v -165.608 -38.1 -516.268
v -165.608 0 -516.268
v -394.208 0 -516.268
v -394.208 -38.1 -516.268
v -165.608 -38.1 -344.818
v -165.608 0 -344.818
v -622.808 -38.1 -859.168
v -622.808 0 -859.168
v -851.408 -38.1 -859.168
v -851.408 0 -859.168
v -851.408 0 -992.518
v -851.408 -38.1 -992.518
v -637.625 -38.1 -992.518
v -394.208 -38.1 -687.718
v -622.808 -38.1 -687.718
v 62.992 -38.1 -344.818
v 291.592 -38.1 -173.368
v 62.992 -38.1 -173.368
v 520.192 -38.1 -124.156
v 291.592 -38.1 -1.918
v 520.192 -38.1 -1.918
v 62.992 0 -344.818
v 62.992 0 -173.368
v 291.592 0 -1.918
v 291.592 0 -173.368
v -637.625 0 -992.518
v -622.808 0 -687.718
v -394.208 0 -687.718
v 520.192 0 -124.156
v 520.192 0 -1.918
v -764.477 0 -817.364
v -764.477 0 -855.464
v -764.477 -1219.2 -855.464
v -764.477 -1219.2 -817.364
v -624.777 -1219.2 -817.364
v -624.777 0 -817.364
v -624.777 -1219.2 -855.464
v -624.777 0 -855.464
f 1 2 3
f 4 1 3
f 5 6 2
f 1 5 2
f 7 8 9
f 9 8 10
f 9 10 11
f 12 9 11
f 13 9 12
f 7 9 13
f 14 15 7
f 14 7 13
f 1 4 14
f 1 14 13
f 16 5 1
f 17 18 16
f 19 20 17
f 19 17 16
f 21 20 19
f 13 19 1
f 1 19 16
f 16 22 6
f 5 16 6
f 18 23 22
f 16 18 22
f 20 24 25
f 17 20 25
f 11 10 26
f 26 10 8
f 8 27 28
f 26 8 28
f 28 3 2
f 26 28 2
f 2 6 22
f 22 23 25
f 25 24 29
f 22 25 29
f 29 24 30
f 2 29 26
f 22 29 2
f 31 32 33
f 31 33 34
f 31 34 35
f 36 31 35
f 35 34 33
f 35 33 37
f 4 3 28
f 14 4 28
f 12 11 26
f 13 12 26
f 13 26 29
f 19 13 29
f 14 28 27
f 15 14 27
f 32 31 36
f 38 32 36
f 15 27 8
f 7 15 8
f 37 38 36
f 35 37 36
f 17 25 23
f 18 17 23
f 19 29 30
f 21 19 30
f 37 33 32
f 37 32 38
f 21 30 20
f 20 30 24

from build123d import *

# Parameters (mm, degrees)
F1_DEPTH = 38.1
F2_W     = 139.7
F2_H     = 38.1
F3_DEPTH = 1219.2


with BuildPart() as f1:
    # F0 (on Front) → F1 (new body)
    with BuildSketch(Plane.XZ):
        Polygon((520.191991, -124.155694), (520.191991, -1.918194), (291.591991, -1.918194), (291.591991, -173.368194), (62.991991, -173.368194), (62.991991, -344.818194), (-165.608009, -344.818194), (-165.608009, -516.268194), (-394.208009, -516.268194), (-394.208009, -687.718194), (-622.808009, -687.718194), (-622.808009, -859.168194), (-851.408009, -859.168194), (-851.408009, -992.518194), (-637.624676, -992.518194), align=None)
    extrude(amount=F1_DEPTH)


with BuildPart() as f3:
    # F2 (on Front) → F3 (new body)
    with BuildSketch(Plane.XZ):
        with Locations((-694.627047, -836.414383)):
            Rectangle(F2_W, F2_H)
    extrude(amount=F3_DEPTH)


solid = Compound([f1.part, f3.part])
